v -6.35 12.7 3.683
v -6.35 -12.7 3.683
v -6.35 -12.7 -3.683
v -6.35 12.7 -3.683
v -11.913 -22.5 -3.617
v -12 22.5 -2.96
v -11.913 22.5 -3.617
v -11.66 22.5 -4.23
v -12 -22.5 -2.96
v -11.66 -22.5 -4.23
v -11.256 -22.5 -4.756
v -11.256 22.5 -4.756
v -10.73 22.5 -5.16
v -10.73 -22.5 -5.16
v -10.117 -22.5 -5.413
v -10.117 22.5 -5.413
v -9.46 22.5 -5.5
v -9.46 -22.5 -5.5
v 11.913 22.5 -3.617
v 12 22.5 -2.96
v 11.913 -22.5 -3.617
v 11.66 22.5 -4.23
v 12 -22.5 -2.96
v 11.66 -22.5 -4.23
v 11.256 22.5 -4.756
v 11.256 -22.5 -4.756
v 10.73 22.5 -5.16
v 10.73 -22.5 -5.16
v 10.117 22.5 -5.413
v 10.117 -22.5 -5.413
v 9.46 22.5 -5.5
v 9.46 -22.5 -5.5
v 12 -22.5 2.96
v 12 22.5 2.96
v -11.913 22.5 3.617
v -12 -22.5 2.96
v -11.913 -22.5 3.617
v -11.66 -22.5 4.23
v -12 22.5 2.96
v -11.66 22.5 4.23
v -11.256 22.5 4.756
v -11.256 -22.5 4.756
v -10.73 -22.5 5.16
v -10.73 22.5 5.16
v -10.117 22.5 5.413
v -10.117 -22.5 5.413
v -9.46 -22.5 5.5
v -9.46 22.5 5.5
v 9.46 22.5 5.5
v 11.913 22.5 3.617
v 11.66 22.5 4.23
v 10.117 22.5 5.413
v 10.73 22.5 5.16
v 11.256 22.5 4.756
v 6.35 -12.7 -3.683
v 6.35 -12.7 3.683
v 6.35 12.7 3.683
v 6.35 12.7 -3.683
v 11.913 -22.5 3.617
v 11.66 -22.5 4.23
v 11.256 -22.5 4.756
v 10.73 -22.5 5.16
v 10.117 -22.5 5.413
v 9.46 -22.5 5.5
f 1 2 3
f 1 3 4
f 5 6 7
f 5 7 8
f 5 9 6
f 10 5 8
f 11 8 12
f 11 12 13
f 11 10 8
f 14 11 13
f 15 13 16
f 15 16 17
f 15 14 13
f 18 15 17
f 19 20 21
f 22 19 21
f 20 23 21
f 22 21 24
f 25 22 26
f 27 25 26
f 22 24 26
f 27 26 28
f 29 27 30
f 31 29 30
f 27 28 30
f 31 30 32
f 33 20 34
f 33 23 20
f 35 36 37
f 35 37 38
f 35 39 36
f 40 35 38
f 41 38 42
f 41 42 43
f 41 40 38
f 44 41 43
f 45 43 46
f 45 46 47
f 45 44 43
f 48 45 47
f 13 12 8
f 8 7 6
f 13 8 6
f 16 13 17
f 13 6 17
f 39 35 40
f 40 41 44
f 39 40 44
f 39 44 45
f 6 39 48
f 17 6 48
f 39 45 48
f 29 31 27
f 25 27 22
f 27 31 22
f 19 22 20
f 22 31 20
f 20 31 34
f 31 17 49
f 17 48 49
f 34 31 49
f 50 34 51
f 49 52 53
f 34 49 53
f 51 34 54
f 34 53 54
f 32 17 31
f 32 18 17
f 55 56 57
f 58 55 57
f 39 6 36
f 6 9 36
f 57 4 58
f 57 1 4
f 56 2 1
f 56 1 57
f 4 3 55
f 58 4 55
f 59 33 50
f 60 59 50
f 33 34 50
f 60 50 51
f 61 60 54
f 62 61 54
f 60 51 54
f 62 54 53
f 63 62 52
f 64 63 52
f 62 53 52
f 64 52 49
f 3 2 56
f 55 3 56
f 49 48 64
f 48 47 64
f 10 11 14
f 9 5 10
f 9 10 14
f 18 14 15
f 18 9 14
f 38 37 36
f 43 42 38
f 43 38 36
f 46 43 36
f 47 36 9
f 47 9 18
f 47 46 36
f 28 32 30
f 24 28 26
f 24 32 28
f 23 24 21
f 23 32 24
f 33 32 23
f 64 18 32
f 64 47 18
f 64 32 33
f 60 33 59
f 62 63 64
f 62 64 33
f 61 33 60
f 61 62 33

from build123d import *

# Parameters (mm, degrees)
F0_W     = 24
F0_H     = 11
F1_DEPTH = 22.5
F2_R     = 2.54
F3_W     = 12.7
F3_H     = 25.4
F4_DEPTH = 3.683


with BuildPart() as f1:
    # F0 (on Front) → F1 (new body, symmetric)
    with BuildSketch(Plane.XZ):
        Rectangle(F0_W, F0_H)
    extrude(amount=F1_DEPTH, both=True)

    # F2
    f2_edges = [f1.edges().sort_by_distance(p)[0] for p in [
        (-12, 0, 5.5),
        (-12, 0, -5.5),
        (12, 0, -5.5),
        (12, 0, 5.5),
    ]]
    fillet(f2_edges, radius=F2_R)

    # F3 (on Top) → F4 (cut, symmetric)
    with BuildSketch(Plane.XY):
        Rectangle(F3_W, F3_H)
    extrude(amount=F4_DEPTH, both=True, mode=Mode.SUBTRACT)


solid = f1.part
